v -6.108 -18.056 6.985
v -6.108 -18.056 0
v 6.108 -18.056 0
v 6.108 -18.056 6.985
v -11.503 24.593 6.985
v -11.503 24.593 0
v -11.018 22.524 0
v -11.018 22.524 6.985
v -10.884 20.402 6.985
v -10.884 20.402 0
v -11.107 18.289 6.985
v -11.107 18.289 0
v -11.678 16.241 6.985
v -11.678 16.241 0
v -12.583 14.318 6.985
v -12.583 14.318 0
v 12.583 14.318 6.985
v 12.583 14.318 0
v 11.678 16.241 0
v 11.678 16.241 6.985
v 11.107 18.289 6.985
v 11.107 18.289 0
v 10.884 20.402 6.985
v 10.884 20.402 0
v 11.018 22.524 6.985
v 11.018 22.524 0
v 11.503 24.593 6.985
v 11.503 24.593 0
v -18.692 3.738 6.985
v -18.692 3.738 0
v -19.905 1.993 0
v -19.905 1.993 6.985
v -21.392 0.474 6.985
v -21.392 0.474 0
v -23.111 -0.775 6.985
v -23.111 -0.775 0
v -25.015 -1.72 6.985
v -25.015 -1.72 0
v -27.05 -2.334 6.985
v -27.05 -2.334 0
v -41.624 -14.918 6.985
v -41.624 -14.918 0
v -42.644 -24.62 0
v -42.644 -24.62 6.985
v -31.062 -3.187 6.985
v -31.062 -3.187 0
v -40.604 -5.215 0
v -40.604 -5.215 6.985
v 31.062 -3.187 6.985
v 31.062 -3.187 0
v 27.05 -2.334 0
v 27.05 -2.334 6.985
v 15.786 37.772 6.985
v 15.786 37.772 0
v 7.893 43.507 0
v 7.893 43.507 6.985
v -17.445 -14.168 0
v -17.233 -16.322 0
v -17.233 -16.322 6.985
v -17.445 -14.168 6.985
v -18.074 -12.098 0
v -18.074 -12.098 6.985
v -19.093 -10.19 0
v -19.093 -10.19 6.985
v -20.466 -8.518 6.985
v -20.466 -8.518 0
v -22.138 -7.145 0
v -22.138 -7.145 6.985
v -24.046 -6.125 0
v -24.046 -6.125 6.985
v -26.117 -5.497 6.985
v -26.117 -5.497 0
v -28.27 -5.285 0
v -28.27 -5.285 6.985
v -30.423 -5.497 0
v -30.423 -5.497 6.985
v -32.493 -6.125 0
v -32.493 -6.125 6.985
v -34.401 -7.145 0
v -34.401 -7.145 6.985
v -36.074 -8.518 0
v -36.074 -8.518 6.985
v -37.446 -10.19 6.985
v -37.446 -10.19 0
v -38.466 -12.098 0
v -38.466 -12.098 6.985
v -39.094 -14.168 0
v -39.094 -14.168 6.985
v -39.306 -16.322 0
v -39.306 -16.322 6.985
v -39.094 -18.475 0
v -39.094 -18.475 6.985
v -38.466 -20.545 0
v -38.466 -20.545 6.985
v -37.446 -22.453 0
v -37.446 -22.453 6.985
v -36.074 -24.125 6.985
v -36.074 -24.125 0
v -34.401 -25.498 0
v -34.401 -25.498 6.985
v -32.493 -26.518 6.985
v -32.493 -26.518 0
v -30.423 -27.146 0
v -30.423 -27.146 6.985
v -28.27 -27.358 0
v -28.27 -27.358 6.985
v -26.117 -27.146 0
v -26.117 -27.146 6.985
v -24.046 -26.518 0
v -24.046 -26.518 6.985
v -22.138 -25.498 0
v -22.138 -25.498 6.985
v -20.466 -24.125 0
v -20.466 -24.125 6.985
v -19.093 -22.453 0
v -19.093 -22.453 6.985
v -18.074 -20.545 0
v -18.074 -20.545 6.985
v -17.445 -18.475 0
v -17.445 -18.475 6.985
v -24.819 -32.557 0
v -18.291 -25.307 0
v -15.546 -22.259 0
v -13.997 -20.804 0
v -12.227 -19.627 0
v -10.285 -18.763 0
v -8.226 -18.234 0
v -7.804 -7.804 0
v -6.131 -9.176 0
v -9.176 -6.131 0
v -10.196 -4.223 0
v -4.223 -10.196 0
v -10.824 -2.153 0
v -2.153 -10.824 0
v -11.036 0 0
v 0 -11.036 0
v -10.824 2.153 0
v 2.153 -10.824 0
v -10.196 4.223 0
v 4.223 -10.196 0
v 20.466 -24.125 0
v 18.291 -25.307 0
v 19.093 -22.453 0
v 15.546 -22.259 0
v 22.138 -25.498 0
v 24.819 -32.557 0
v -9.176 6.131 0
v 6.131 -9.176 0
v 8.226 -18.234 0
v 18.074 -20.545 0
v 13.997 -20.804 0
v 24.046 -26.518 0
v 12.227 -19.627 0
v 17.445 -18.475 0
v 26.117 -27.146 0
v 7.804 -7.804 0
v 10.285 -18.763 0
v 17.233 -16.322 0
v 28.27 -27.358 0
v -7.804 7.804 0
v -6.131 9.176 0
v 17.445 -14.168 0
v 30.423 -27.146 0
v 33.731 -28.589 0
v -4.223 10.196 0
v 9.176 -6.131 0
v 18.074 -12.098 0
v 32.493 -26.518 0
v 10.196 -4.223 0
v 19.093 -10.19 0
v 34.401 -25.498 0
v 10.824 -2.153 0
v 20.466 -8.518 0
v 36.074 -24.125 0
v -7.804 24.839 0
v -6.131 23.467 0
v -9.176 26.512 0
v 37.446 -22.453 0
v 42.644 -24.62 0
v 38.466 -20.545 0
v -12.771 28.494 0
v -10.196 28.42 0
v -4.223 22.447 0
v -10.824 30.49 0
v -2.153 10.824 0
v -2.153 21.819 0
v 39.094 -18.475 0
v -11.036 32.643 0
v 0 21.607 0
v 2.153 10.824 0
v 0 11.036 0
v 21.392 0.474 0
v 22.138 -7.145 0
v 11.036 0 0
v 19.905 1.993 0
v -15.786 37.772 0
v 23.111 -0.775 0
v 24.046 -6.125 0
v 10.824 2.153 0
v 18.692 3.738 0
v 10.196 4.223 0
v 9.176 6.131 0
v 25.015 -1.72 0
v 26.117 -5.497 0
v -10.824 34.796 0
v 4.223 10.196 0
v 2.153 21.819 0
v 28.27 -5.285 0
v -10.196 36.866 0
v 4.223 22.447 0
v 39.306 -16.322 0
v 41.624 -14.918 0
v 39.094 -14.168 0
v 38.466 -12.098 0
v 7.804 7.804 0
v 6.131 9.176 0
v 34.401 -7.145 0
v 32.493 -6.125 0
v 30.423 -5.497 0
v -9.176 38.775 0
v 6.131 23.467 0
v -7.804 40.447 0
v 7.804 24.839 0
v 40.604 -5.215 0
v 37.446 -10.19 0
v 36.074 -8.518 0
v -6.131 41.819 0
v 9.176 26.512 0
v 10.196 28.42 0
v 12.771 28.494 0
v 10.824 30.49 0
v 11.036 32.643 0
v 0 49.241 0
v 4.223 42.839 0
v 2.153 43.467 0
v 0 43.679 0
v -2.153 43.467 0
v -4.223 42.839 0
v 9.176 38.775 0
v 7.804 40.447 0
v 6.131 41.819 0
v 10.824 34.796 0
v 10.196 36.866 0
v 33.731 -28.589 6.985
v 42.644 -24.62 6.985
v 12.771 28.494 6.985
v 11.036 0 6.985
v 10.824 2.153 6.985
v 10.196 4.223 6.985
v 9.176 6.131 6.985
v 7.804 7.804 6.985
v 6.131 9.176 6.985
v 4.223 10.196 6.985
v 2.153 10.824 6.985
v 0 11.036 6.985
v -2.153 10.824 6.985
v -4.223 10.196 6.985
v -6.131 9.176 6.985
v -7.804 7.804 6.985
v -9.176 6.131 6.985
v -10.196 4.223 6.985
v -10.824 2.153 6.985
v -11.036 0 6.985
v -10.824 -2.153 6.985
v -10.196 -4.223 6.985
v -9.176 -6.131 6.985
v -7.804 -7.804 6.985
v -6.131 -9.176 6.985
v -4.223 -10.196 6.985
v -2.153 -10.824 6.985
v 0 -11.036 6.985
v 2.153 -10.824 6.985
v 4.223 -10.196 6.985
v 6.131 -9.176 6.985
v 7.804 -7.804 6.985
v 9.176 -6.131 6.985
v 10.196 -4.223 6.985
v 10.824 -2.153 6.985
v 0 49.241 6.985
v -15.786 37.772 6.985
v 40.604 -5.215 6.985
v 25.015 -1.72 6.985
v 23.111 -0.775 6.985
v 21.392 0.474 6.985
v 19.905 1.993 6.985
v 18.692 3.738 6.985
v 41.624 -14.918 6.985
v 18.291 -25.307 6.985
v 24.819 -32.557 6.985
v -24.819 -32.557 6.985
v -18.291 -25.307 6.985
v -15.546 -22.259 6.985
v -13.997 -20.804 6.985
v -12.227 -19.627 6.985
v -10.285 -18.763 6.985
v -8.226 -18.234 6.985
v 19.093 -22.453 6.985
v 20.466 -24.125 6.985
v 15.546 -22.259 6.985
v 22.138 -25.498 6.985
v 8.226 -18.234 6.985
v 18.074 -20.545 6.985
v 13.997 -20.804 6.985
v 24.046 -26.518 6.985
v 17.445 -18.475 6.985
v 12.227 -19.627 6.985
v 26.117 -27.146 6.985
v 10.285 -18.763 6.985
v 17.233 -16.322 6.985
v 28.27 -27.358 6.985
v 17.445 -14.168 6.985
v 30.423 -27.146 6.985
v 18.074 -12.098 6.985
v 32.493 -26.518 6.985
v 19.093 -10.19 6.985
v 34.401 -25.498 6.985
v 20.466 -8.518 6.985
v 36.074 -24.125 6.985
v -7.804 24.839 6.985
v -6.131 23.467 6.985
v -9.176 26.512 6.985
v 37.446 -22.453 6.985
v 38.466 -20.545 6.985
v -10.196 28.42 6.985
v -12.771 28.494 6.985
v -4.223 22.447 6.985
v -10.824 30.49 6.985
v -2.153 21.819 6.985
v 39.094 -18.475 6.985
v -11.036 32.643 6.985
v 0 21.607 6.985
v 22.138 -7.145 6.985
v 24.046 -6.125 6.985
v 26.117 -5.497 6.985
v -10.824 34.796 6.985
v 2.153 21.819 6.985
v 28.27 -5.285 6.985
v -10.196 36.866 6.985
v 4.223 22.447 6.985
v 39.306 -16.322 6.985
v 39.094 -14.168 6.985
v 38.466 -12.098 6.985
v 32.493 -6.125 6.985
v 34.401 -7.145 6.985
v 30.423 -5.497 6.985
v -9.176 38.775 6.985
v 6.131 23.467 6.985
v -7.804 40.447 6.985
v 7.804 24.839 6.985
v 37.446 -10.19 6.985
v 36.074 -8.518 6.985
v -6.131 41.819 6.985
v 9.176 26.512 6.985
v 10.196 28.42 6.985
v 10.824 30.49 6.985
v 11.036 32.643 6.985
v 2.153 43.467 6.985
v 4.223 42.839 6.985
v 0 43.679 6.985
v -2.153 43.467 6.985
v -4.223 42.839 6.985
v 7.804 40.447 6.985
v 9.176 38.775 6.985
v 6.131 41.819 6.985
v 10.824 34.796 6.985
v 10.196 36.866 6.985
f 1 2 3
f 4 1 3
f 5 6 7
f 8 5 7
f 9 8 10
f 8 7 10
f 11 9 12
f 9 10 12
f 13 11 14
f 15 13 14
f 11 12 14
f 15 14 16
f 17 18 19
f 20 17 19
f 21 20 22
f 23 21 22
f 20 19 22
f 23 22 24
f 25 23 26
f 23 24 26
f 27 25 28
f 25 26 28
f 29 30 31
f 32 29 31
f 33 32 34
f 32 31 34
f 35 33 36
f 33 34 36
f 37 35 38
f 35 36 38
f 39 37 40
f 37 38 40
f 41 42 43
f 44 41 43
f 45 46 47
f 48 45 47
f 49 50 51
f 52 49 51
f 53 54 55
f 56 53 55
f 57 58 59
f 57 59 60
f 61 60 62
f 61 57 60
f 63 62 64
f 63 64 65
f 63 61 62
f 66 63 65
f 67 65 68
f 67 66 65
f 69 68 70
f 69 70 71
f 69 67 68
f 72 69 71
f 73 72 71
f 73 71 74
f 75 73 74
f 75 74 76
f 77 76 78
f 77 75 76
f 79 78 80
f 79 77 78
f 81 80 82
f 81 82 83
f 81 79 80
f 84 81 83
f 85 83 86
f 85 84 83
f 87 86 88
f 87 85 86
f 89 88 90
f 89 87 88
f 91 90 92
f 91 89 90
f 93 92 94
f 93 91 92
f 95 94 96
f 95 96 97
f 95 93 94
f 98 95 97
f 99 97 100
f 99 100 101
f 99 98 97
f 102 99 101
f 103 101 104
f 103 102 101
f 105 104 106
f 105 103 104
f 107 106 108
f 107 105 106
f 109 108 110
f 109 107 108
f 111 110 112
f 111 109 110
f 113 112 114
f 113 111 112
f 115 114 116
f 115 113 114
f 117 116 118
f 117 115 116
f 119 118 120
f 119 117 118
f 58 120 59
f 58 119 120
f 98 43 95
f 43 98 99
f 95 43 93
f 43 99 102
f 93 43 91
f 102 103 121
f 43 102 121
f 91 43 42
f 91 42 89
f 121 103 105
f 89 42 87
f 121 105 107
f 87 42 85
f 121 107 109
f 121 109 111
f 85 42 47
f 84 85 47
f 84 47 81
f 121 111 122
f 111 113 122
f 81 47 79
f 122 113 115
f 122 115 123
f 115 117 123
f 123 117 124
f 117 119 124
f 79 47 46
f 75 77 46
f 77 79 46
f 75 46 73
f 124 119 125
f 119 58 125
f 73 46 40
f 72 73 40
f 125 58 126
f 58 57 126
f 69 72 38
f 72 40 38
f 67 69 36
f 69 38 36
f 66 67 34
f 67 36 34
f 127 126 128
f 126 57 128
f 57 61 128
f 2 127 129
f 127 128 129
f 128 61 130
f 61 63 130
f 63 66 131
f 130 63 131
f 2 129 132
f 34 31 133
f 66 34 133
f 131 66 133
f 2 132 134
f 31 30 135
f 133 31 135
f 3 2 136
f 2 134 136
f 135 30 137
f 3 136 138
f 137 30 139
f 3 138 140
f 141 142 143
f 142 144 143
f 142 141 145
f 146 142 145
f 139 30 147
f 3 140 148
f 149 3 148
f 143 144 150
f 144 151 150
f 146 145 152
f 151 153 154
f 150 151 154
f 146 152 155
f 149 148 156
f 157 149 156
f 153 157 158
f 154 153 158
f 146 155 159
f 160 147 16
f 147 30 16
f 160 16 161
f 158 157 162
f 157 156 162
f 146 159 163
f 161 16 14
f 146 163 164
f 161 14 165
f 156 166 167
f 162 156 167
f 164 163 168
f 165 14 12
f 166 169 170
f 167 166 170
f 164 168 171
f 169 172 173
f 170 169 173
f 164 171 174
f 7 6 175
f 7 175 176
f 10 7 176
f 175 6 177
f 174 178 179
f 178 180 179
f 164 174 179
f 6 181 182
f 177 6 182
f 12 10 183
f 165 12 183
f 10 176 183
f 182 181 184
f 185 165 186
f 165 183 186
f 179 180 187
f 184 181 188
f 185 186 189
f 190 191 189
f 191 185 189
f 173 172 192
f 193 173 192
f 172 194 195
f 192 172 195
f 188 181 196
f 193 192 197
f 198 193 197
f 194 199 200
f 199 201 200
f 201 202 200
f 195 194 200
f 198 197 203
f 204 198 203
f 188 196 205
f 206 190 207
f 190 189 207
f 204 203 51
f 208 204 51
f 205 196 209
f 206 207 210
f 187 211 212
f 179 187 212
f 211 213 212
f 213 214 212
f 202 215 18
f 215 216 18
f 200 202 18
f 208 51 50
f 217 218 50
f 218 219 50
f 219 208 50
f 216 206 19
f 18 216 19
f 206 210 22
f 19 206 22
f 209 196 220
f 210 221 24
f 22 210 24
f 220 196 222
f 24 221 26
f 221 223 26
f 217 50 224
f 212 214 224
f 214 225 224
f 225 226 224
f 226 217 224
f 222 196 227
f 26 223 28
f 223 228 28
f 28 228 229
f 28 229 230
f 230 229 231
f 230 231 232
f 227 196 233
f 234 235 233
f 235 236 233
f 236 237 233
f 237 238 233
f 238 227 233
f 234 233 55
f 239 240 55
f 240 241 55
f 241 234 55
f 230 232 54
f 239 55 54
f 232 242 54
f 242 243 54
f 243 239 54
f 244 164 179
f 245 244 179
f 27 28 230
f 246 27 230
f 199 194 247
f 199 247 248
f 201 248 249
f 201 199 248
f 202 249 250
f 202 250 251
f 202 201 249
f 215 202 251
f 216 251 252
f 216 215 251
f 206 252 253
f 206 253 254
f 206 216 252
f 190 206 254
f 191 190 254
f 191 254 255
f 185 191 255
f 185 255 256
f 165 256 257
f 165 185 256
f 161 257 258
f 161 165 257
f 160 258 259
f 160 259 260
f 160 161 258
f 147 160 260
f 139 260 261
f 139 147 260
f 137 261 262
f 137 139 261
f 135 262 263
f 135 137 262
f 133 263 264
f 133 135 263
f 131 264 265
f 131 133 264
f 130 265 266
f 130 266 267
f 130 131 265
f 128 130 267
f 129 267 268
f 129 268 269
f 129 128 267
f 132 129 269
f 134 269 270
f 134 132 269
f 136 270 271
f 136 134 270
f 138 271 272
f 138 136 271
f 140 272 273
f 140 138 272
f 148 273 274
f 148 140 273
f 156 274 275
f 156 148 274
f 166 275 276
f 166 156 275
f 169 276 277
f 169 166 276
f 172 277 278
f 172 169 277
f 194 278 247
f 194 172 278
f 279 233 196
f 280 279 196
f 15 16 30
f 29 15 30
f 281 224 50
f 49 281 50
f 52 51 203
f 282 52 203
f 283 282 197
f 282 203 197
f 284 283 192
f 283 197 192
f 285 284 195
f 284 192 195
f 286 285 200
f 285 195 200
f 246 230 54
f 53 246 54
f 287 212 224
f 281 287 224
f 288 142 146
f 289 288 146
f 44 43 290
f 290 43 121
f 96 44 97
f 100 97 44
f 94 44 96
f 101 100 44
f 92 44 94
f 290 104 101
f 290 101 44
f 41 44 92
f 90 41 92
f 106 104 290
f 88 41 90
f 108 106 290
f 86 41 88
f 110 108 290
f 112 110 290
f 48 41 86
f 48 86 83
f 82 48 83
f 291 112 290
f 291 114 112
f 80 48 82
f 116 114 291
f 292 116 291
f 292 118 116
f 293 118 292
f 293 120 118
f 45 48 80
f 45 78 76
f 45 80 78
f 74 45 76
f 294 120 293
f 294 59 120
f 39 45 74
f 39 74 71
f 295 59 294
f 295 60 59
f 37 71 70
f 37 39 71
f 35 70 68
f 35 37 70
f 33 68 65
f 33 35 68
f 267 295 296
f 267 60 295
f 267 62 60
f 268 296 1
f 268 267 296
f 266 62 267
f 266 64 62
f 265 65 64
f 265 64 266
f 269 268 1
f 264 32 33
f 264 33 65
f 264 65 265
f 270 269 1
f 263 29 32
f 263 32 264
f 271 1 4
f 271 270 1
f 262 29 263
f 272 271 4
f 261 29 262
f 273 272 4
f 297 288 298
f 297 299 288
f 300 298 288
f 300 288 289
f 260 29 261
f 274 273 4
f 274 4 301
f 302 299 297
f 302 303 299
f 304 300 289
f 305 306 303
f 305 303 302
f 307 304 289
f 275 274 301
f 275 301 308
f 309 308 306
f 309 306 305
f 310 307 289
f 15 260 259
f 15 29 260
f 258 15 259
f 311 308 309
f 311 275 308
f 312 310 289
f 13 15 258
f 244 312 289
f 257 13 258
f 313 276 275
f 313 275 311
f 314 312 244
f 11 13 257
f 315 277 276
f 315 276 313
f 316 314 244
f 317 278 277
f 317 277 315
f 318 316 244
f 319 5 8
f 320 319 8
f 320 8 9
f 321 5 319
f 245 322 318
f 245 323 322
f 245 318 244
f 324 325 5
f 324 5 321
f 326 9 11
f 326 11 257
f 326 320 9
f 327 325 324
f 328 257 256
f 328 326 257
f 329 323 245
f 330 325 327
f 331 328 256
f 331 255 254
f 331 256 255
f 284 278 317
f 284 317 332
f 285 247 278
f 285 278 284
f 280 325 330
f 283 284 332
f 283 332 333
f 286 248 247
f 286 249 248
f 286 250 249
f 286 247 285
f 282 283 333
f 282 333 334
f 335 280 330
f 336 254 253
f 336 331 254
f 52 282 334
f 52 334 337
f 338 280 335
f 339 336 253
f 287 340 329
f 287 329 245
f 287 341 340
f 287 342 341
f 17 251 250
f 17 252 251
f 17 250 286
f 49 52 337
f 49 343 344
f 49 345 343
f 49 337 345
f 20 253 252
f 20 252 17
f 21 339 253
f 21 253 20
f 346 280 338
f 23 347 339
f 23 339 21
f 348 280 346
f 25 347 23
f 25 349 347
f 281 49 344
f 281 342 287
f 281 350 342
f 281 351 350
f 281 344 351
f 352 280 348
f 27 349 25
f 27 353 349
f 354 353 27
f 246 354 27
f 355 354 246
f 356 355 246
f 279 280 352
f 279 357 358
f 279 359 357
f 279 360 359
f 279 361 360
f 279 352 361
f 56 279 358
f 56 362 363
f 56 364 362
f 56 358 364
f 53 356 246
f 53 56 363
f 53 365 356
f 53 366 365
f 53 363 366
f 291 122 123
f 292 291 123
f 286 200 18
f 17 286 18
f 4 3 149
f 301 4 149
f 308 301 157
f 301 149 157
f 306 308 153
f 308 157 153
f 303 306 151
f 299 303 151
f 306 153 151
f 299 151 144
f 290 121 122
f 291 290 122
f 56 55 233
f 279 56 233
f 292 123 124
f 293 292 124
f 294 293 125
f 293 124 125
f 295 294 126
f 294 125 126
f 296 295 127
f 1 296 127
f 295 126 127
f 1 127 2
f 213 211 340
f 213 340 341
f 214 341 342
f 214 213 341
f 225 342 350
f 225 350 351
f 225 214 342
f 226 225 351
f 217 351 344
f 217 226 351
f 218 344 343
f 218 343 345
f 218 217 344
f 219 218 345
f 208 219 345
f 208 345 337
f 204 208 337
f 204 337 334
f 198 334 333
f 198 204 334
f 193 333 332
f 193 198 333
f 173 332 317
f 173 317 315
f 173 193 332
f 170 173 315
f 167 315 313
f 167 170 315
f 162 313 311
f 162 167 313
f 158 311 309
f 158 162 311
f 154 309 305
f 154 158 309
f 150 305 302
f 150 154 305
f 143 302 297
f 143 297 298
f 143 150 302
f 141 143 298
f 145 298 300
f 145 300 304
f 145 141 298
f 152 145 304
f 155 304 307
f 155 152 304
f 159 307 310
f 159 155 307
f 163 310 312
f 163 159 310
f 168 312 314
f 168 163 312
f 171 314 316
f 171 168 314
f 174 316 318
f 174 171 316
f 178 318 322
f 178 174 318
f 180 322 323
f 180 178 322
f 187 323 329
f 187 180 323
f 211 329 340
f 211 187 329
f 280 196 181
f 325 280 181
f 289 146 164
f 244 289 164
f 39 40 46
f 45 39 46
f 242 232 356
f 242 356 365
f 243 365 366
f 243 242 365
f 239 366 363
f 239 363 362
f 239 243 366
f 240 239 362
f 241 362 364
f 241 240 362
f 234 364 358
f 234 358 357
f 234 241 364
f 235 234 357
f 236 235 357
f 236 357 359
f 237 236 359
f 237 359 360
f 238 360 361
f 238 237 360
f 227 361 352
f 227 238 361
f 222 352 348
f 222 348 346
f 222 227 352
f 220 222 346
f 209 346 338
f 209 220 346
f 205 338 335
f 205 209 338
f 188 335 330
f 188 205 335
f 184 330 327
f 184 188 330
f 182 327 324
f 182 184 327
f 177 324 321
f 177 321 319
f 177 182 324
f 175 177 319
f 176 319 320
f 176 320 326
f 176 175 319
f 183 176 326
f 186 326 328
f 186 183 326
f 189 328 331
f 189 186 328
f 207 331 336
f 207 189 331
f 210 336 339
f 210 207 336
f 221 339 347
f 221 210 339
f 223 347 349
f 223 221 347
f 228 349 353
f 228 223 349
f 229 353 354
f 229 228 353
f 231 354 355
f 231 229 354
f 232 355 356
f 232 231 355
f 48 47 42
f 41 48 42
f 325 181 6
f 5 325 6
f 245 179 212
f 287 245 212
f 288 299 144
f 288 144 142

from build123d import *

# Parameters (mm, degrees)
F0_R     = 11.0363
F1_DEPTH = 6.985


with BuildPart() as f1:
    # F0 (on Top) → F1 (new body)
    with BuildSketch(Plane.XY):
        with BuildLine():
            ThreePointArc((12.7707550595, 28.4936086172), (13.2626459449, 30.5424816606), (13.4279664867, 32.6430783639))
            ThreePointArc((13.4279664867, 32.6430783639), (11.9644057547, 38.739247563), (7.8927606994, 43.5065314296))
            ThreePointArc((7.8927606994, 43.5065314296), (-4.13e-08, 46.0710448506), (-7.8927607663, 43.506531381))
            ThreePointArc((-7.8927607663, 43.506531381), (-12.7707550555, 36.7925481229), (-12.7707550095, 28.4936084631))
            ThreePointArc((-12.7707550095, 28.4936084631), (8.1e-08, 19.2151118771), (12.7707550595, 28.4936086172))
        make_face()
        with Locations((0, 32.6430783639)):
            Circle(F0_R, mode=Mode.SUBTRACT)
        with BuildLine():
            ThreePointArc((7.8927606994, 43.5065314296), (11.9644057547, 38.739247563), (13.4279664867, 32.6430783639))
            ThreePointArc((13.4279664867, 32.6430783639), (13.2626459449, 30.5424816606), (12.7707550595, 28.4936086172))
            Line((12.7707550595, 28.4936086172), (15.7855213384, 37.772105162))
            Line((15.7855213384, 37.772105162), (7.8927606994, 43.5065314296))
        make_face()
        with BuildLine():
            ThreePointArc((-7.8927607663, 43.506531381), (-4.13e-08, 46.0710448506), (7.8927606994, 43.5065314296))
            Line((7.8927606994, 43.5065314296), (0, 49.2409577411))
            Line((0, 49.2409577411), (-7.8927607663, 43.506531381))
        make_face()
        with BuildLine():
            Line((11.5032957401, 24.5927699357), (12.7707550595, 28.4936086172))
            ThreePointArc((12.7707550595, 28.4936086172), (8.1e-08, 19.2151118771), (-12.7707550095, 28.4936084631))
            Line((-12.7707550095, 28.4936084631), (-11.5032957401, 24.5927699357))
            ThreePointArc((-11.5032957401, 24.5927699357), (-10.9512854258, 19.3407426236), (-12.583190869, 14.3182541071))
            Line((-12.583190869, 14.3182541071), (-18.6915672291, 3.7382358996))
            ThreePointArc((-18.6915672291, 3.7382358996), (-22.225217153, -0.1862799289), (-27.0496113837, -2.3342386297))
            Line((-27.0496113837, -2.3342386297), (-31.0615663455, -3.1870059819))
            ThreePointArc((-31.0615663455, -3.1870059819), (-19.8192420037, -5.8860492535), (-14.8417686341, -16.3215391819))
            ThreePointArc((-14.8417686341, -16.3215391819), (-15.7336484589, -21.1336920446), (-18.2908113758, -25.306602613))
            Line((-18.2908113758, -25.306602613), (-15.5463156437, -22.258531306))
            ThreePointArc((-15.5463156437, -22.258531306), (-11.2739317272, -19.1544626947), (-6.1083763601, -18.0564900067))
            Line((-6.1083763601, -18.0564900067), (6.1083763601, -18.0564900067))
            ThreePointArc((6.1083763601, -18.0564900067), (11.2739317272, -19.1544626947), (15.5463156437, -22.258531306))
            Line((15.5463156437, -22.258531306), (18.2908113758, -25.306602613))
            ThreePointArc((18.2908113758, -25.306602613), (16.6407750687, -9.607555858), (31.0615666162, -3.1870060395))
            Line((31.0615666162, -3.1870060395), (27.0496113837, -2.3342386297))
            ThreePointArc((27.0496113837, -2.3342386297), (22.225217153, -0.1862799289), (18.6915672291, 3.7382358996))
            Line((18.6915672291, 3.7382358996), (12.583190869, 14.3182541071))
            ThreePointArc((12.583190869, 14.3182541071), (10.9512854258, 19.3407426236), (11.5032957401, 24.5927699357))
        make_face()
        Circle(F0_R, mode=Mode.SUBTRACT)
        with BuildLine():
            ThreePointArc((-12.7707550095, 28.4936084631), (-12.7707550555, 36.7925481229), (-7.8927607663, 43.506531381))
            Line((-7.8927607663, 43.506531381), (-15.7855213384, 37.772105162))
            Line((-15.7855213384, 37.772105162), (-12.7707550095, 28.4936084631))
        make_face()
        with BuildLine():
            Line((40.6043632939, -5.21539009), (31.0615666162, -3.1870060395))
            ThreePointArc((31.0615666162, -3.1870060395), (38.2486591322, -7.3364760466), (41.6241418349, -14.9179347913))
            Line((41.6241418349, -14.9179347913), (40.6043632939, -5.21539009))
        make_face()
        with BuildLine():
            ThreePointArc((41.6241418349, -14.9179347913), (38.2486591322, -7.3364760466), (31.0615666162, -3.1870060395))
            ThreePointArc((31.0615666162, -3.1870060395), (16.6407750687, -9.607555858), (18.2908113758, -25.306602613))
            ThreePointArc((18.2908113758, -25.306602613), (25.4779040103, -29.4560724062), (33.7313812405, -28.5885969234))
            ThreePointArc((33.7313812405, -28.5885969234), (39.5313754327, -23.6349338421), (41.6977016076, -16.3215391819))
            ThreePointArc((41.6977016076, -16.3215391819), (41.6792990544, -15.6187738716), (41.6241418349, -14.9179347913))
        make_face()
        with Locations((28.2697351208, -16.3215391819)):
            Circle(F0_R, mode=Mode.SUBTRACT)
        with BuildLine():
            ThreePointArc((-14.8417686341, -16.3215391819), (-19.8192420037, -5.8860492535), (-31.0615663455, -3.1870059819))
            ThreePointArc((-31.0615663455, -3.1870059819), (-38.2486589518, -7.3364758463), (-41.6241418074, -14.9179345303))
            ThreePointArc((-41.6241418074, -14.9179345303), (-39.8986951958, -23.0355224663), (-33.7313810924, -28.5885969893))
            ThreePointArc((-33.7313810924, -28.5885969893), (-25.477903931, -29.4560723893), (-18.2908113758, -25.306602613))
            ThreePointArc((-18.2908113758, -25.306602613), (-15.7336484589, -21.1336920446), (-14.8417686341, -16.3215391819))
        make_face()
        with Locations((-28.2697351208, -16.3215391819)):
            Circle(F0_R, mode=Mode.SUBTRACT)
        with BuildLine():
            ThreePointArc((-41.6241418074, -14.9179345303), (-38.2486589518, -7.3364758463), (-31.0615663455, -3.1870059819))
            Line((-31.0615663455, -3.1870059819), (-40.6043632939, -5.21539009))
            Line((-40.6043632939, -5.21539009), (-41.6241418074, -14.9179345303))
        make_face()
        with BuildLine():
            Line((42.6439203104, -24.6204788705), (41.6241418349, -14.9179347913))
            ThreePointArc((41.6241418349, -14.9179347913), (41.6792990544, -15.6187738716), (41.6977016076, -16.3215391819))
            ThreePointArc((41.6977016076, -16.3215391819), (39.5313754327, -23.6349338421), (33.7313812405, -28.5885969234))
            Line((33.7313812405, -28.5885969234), (42.6439203104, -24.6204788705))
        make_face()
        with BuildLine():
            ThreePointArc((33.7313812405, -28.5885969234), (25.4779040103, -29.4560724062), (18.2908113758, -25.306602613))
            Line((18.2908113758, -25.306602613), (24.8188419555, -32.556715072))
            Line((24.8188419555, -32.556715072), (33.7313812405, -28.5885969234))
        make_face()
        with BuildLine():
            ThreePointArc((-33.7313810924, -28.5885969893), (-39.8986951958, -23.0355224663), (-41.6241418074, -14.9179345303))
            Line((-41.6241418074, -14.9179345303), (-42.6439203104, -24.6204788705))
            Line((-42.6439203104, -24.6204788705), (-33.7313810924, -28.5885969893))
        make_face()
        with BuildLine():
            Line((-24.8188419555, -32.556715072), (-18.2908113758, -25.306602613))
            ThreePointArc((-18.2908113758, -25.306602613), (-25.477903931, -29.4560723893), (-33.7313810924, -28.5885969893))
            Line((-33.7313810924, -28.5885969893), (-24.8188419555, -32.556715072))
        make_face()
    extrude(amount=F1_DEPTH)


solid = f1.part
